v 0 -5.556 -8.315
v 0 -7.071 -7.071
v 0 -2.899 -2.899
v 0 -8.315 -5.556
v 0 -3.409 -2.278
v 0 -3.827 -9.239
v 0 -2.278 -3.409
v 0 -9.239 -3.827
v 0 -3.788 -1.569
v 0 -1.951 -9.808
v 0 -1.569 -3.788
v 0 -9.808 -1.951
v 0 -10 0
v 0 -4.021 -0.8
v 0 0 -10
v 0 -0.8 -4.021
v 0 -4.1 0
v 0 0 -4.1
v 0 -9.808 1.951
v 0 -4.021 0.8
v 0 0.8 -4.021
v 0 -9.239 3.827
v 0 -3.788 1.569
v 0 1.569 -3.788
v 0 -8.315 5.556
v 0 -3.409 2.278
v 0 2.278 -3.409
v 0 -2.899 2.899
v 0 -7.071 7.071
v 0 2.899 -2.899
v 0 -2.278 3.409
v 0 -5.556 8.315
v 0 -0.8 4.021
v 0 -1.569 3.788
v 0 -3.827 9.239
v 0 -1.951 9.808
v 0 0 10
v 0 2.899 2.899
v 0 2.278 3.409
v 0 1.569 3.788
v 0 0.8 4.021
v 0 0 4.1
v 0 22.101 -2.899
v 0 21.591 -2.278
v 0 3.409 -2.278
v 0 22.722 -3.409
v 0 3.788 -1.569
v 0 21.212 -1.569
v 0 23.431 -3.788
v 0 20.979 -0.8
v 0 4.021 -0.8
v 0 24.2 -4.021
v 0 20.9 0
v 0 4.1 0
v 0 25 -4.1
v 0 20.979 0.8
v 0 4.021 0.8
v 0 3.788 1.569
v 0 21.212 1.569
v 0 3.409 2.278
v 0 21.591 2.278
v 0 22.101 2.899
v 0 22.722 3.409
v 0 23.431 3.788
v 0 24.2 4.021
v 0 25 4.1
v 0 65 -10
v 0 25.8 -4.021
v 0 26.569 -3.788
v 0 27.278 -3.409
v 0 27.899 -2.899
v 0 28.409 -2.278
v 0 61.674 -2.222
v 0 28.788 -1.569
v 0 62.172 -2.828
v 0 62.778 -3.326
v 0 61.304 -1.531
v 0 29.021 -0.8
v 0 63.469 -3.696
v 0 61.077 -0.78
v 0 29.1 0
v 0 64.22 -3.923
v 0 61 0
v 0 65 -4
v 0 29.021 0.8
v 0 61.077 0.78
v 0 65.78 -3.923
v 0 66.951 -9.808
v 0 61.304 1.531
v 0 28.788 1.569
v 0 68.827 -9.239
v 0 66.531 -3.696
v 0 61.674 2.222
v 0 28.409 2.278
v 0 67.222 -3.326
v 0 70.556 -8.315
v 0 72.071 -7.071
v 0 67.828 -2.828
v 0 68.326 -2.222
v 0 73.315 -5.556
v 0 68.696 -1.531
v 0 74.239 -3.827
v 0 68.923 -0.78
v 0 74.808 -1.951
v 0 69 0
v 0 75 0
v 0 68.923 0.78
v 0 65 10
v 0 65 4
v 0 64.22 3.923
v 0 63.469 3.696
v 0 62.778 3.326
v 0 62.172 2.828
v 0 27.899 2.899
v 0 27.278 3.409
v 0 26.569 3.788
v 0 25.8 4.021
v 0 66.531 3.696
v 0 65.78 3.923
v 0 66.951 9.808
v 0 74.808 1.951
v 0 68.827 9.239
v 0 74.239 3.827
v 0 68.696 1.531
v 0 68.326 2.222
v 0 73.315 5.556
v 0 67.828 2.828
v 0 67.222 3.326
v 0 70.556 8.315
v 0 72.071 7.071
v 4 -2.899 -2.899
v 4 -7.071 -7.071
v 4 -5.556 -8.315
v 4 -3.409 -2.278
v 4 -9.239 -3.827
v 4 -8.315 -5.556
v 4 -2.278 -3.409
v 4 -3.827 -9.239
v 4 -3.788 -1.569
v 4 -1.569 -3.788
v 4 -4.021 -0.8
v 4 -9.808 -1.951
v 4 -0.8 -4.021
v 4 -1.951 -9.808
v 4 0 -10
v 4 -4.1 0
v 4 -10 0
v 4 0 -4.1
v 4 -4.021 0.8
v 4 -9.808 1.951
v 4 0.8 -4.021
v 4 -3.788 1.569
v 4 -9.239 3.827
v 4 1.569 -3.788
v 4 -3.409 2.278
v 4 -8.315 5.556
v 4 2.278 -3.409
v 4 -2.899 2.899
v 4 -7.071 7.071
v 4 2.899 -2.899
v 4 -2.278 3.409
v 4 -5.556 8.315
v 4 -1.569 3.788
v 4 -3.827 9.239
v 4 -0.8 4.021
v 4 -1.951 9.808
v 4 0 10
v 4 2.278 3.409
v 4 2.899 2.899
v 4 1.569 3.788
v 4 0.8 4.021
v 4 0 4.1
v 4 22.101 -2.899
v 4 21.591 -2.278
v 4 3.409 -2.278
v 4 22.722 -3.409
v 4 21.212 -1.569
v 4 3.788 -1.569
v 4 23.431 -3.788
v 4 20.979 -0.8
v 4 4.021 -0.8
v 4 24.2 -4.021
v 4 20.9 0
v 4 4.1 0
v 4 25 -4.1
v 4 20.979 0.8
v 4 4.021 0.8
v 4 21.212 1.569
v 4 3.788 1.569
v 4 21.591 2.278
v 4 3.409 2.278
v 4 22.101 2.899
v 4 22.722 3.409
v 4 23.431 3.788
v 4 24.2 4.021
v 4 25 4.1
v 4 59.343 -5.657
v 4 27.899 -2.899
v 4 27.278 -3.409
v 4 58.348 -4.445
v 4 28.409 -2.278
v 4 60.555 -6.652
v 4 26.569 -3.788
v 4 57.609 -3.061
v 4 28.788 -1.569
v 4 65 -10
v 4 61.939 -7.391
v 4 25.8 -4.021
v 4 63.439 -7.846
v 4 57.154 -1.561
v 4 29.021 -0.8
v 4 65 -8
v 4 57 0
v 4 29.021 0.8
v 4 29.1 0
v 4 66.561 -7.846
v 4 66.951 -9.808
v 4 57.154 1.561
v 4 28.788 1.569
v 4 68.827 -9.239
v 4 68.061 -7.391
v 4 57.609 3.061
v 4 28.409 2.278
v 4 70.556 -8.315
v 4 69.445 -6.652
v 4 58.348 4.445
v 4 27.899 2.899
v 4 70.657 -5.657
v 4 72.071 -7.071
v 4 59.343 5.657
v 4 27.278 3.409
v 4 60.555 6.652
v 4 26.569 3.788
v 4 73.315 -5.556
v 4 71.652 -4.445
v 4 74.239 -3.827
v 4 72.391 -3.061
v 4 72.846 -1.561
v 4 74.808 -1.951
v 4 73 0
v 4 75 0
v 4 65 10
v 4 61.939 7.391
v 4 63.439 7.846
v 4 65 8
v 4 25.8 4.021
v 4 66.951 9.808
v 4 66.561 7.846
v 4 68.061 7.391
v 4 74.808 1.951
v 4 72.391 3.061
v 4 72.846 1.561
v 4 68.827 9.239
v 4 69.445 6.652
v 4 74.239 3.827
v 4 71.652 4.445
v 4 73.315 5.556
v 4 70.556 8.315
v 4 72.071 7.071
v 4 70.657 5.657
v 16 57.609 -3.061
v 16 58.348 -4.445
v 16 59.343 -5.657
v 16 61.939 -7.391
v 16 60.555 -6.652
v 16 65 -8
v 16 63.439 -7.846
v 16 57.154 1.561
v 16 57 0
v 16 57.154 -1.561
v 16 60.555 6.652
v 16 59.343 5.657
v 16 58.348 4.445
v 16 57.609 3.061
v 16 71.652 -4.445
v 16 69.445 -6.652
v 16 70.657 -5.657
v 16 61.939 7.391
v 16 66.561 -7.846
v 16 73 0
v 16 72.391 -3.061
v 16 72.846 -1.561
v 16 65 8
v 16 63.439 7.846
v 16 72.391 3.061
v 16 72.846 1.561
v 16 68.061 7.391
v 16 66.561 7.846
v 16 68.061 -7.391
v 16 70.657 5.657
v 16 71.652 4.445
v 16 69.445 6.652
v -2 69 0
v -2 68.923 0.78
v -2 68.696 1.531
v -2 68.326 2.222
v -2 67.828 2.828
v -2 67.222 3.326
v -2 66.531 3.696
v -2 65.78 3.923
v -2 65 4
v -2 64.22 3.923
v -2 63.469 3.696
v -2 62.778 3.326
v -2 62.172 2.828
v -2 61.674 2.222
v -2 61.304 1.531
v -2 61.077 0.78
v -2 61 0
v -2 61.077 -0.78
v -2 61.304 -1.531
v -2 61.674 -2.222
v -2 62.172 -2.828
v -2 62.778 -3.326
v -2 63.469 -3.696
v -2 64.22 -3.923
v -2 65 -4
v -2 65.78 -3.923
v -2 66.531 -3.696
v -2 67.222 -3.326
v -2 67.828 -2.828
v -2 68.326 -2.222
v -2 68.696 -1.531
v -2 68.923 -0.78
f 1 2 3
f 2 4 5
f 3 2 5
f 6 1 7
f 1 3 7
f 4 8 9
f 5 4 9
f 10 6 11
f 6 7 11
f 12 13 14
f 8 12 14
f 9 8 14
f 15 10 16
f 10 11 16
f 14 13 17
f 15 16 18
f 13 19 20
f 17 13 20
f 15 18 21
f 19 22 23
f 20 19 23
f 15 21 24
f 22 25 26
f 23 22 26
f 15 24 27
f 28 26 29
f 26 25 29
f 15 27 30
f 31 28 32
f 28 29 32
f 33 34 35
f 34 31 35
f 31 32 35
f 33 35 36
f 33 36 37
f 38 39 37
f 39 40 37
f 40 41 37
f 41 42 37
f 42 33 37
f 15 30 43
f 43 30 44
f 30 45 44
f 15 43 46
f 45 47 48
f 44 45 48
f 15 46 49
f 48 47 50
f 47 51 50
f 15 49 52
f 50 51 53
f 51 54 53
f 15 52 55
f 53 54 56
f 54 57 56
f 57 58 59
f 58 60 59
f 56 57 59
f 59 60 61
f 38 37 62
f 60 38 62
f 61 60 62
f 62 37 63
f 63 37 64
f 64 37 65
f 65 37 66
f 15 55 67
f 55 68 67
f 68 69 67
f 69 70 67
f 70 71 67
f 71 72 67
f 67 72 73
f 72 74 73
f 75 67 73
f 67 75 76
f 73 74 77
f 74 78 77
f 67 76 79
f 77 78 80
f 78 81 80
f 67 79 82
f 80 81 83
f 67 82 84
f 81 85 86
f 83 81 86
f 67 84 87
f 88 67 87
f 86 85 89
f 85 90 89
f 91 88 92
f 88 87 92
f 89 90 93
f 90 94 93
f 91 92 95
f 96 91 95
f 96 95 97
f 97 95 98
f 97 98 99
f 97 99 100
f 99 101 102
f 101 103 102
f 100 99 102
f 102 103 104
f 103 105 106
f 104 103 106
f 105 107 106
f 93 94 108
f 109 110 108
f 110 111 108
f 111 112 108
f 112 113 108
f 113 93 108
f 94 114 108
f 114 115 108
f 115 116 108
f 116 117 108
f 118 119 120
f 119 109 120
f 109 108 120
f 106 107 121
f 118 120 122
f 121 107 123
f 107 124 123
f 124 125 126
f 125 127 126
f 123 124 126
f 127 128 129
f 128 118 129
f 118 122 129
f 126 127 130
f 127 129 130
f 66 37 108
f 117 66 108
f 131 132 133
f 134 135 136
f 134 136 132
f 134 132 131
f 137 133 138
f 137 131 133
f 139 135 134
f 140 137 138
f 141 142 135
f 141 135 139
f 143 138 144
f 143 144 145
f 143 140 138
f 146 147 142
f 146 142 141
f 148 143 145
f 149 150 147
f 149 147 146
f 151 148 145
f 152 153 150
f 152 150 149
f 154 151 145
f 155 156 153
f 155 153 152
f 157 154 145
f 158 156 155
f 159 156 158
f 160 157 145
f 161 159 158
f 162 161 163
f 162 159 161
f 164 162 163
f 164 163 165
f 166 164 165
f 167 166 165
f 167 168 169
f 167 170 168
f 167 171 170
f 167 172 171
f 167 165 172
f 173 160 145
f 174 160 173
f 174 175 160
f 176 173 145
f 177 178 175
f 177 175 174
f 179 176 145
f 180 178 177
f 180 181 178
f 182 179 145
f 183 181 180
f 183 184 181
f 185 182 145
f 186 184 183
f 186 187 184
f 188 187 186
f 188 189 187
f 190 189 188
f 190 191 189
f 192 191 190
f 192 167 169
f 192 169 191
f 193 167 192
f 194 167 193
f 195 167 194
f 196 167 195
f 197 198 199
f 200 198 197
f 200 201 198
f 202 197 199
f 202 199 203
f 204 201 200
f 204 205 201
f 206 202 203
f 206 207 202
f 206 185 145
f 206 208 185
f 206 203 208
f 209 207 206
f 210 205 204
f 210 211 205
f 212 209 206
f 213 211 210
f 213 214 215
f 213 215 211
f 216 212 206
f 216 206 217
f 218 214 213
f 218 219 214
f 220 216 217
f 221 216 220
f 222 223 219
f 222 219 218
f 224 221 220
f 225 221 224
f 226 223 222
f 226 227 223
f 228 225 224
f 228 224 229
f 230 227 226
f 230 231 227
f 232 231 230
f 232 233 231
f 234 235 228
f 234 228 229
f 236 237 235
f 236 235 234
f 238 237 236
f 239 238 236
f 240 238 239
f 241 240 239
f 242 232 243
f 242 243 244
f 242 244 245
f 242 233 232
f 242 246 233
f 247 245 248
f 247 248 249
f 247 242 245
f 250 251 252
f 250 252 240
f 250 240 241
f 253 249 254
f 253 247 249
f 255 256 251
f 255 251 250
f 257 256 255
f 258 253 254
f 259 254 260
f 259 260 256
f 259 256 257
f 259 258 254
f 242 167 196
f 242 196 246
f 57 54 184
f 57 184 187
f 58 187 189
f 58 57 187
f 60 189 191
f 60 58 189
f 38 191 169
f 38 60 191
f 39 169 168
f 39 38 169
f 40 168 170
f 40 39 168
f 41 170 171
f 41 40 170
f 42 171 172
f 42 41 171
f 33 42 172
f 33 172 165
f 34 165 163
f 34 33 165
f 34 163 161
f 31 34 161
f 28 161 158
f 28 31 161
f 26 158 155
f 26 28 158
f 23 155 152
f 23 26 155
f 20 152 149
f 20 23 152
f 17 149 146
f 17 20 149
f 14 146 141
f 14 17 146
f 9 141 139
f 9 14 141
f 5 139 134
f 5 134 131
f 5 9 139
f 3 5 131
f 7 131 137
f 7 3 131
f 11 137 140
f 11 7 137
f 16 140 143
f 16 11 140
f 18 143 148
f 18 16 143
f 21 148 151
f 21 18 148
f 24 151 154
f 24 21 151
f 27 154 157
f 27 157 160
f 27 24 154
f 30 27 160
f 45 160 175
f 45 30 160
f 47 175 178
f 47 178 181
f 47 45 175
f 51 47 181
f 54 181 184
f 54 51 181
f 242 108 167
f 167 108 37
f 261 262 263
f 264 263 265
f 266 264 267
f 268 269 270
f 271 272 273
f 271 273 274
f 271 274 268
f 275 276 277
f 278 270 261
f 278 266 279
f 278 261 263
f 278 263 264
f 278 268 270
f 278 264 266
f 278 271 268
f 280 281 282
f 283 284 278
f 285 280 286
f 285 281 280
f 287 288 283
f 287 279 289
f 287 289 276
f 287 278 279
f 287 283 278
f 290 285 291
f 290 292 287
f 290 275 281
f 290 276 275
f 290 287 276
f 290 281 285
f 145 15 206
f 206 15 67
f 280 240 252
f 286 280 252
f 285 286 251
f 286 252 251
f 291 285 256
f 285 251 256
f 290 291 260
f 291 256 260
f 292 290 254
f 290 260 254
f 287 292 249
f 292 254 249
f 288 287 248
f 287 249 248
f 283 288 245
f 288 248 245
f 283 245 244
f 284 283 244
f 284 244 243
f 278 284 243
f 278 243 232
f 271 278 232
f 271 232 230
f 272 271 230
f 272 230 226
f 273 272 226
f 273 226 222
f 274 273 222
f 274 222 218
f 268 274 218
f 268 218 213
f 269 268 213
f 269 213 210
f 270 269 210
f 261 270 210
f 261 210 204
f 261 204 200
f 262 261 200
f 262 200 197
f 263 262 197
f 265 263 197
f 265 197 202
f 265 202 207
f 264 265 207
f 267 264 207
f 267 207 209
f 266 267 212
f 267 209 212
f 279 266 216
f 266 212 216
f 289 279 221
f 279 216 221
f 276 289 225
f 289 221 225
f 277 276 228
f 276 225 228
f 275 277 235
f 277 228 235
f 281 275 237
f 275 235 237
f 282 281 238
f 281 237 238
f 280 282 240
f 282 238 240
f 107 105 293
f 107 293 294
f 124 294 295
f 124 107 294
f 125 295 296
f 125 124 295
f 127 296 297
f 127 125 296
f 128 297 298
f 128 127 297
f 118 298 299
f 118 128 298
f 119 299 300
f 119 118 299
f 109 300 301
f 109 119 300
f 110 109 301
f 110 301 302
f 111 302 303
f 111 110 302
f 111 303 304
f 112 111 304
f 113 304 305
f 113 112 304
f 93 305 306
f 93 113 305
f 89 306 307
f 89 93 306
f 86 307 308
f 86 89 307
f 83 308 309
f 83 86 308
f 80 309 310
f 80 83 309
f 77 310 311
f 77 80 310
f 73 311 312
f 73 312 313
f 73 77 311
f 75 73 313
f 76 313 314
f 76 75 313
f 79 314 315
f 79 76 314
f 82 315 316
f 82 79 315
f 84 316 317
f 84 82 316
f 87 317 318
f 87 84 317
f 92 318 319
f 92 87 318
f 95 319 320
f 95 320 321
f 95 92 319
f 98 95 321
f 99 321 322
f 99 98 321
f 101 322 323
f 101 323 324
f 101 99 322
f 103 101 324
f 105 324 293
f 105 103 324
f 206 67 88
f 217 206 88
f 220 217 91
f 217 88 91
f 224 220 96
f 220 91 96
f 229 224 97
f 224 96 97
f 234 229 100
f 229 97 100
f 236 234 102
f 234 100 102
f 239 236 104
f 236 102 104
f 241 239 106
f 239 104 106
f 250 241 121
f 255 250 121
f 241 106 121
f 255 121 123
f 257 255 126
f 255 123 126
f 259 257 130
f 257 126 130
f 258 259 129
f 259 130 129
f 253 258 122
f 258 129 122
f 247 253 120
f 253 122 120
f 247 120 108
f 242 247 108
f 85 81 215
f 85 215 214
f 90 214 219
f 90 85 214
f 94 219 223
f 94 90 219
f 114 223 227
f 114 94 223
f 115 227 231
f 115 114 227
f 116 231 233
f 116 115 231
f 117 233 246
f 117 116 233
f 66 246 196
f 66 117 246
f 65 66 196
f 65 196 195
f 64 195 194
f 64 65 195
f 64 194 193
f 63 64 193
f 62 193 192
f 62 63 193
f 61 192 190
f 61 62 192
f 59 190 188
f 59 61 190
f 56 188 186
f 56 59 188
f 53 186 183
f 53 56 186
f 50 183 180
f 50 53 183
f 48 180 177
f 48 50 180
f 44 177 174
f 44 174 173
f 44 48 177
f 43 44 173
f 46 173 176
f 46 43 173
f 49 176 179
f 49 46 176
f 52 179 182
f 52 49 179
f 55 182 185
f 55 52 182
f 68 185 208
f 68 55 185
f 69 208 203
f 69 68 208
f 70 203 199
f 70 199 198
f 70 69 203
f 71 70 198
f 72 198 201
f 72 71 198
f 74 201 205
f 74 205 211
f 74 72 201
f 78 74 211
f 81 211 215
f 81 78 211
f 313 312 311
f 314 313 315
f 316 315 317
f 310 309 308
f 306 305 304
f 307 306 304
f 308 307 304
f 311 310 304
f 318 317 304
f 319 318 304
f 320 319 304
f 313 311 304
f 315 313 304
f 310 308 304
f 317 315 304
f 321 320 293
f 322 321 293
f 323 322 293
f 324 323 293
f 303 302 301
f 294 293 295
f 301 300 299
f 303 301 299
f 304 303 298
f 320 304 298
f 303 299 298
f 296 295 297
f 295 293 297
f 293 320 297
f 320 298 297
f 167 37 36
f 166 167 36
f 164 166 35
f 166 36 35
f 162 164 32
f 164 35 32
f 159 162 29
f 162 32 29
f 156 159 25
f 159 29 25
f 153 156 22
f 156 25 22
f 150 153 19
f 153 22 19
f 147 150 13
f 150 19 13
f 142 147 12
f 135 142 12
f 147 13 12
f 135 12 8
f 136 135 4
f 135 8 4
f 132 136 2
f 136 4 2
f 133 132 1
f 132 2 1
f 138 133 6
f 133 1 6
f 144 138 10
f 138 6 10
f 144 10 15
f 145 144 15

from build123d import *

# Parameters (mm, degrees)
F0_R     = 4.1
F1_DEPTH = 4
F2_R     = 8
F2_R_2   = 4
F3_DEPTH = 16
F4_DEPTH = 2


with BuildPart() as f1:
    # F0 (on Right) → F1 (new body)
    with BuildSketch(Plane.YZ):
        with BuildLine():
            Line((65, 10), (0, 10))
            ThreePointArc((0, 10), (-10, 0), (0, -10))
            Line((0, -10), (65, -10))
            ThreePointArc((65, -10), (75, 0), (65, 10))
        make_face()
        Circle(F0_R, mode=Mode.SUBTRACT)
        with Locations((25, 0)):
            Circle(F0_R, mode=Mode.SUBTRACT)
    extrude(amount=F1_DEPTH)

    # F2 (on Right) → F3 (join)
    with BuildSketch(Plane.YZ):
        with Locations((65, 0)):
            Circle(F2_R)
        with Locations((65, 0)):
            Circle(F2_R_2, mode=Mode.SUBTRACT)
        with Locations((65, 0)):
            Circle(F2_R_2)
    extrude(amount=F3_DEPTH)

    # F2 (on Right) → F4 (join)
    with BuildSketch(Plane.YZ):
        with Locations((65, 0)):
            Circle(F2_R_2)
    extrude(amount=-F4_DEPTH)


solid = f1.part
